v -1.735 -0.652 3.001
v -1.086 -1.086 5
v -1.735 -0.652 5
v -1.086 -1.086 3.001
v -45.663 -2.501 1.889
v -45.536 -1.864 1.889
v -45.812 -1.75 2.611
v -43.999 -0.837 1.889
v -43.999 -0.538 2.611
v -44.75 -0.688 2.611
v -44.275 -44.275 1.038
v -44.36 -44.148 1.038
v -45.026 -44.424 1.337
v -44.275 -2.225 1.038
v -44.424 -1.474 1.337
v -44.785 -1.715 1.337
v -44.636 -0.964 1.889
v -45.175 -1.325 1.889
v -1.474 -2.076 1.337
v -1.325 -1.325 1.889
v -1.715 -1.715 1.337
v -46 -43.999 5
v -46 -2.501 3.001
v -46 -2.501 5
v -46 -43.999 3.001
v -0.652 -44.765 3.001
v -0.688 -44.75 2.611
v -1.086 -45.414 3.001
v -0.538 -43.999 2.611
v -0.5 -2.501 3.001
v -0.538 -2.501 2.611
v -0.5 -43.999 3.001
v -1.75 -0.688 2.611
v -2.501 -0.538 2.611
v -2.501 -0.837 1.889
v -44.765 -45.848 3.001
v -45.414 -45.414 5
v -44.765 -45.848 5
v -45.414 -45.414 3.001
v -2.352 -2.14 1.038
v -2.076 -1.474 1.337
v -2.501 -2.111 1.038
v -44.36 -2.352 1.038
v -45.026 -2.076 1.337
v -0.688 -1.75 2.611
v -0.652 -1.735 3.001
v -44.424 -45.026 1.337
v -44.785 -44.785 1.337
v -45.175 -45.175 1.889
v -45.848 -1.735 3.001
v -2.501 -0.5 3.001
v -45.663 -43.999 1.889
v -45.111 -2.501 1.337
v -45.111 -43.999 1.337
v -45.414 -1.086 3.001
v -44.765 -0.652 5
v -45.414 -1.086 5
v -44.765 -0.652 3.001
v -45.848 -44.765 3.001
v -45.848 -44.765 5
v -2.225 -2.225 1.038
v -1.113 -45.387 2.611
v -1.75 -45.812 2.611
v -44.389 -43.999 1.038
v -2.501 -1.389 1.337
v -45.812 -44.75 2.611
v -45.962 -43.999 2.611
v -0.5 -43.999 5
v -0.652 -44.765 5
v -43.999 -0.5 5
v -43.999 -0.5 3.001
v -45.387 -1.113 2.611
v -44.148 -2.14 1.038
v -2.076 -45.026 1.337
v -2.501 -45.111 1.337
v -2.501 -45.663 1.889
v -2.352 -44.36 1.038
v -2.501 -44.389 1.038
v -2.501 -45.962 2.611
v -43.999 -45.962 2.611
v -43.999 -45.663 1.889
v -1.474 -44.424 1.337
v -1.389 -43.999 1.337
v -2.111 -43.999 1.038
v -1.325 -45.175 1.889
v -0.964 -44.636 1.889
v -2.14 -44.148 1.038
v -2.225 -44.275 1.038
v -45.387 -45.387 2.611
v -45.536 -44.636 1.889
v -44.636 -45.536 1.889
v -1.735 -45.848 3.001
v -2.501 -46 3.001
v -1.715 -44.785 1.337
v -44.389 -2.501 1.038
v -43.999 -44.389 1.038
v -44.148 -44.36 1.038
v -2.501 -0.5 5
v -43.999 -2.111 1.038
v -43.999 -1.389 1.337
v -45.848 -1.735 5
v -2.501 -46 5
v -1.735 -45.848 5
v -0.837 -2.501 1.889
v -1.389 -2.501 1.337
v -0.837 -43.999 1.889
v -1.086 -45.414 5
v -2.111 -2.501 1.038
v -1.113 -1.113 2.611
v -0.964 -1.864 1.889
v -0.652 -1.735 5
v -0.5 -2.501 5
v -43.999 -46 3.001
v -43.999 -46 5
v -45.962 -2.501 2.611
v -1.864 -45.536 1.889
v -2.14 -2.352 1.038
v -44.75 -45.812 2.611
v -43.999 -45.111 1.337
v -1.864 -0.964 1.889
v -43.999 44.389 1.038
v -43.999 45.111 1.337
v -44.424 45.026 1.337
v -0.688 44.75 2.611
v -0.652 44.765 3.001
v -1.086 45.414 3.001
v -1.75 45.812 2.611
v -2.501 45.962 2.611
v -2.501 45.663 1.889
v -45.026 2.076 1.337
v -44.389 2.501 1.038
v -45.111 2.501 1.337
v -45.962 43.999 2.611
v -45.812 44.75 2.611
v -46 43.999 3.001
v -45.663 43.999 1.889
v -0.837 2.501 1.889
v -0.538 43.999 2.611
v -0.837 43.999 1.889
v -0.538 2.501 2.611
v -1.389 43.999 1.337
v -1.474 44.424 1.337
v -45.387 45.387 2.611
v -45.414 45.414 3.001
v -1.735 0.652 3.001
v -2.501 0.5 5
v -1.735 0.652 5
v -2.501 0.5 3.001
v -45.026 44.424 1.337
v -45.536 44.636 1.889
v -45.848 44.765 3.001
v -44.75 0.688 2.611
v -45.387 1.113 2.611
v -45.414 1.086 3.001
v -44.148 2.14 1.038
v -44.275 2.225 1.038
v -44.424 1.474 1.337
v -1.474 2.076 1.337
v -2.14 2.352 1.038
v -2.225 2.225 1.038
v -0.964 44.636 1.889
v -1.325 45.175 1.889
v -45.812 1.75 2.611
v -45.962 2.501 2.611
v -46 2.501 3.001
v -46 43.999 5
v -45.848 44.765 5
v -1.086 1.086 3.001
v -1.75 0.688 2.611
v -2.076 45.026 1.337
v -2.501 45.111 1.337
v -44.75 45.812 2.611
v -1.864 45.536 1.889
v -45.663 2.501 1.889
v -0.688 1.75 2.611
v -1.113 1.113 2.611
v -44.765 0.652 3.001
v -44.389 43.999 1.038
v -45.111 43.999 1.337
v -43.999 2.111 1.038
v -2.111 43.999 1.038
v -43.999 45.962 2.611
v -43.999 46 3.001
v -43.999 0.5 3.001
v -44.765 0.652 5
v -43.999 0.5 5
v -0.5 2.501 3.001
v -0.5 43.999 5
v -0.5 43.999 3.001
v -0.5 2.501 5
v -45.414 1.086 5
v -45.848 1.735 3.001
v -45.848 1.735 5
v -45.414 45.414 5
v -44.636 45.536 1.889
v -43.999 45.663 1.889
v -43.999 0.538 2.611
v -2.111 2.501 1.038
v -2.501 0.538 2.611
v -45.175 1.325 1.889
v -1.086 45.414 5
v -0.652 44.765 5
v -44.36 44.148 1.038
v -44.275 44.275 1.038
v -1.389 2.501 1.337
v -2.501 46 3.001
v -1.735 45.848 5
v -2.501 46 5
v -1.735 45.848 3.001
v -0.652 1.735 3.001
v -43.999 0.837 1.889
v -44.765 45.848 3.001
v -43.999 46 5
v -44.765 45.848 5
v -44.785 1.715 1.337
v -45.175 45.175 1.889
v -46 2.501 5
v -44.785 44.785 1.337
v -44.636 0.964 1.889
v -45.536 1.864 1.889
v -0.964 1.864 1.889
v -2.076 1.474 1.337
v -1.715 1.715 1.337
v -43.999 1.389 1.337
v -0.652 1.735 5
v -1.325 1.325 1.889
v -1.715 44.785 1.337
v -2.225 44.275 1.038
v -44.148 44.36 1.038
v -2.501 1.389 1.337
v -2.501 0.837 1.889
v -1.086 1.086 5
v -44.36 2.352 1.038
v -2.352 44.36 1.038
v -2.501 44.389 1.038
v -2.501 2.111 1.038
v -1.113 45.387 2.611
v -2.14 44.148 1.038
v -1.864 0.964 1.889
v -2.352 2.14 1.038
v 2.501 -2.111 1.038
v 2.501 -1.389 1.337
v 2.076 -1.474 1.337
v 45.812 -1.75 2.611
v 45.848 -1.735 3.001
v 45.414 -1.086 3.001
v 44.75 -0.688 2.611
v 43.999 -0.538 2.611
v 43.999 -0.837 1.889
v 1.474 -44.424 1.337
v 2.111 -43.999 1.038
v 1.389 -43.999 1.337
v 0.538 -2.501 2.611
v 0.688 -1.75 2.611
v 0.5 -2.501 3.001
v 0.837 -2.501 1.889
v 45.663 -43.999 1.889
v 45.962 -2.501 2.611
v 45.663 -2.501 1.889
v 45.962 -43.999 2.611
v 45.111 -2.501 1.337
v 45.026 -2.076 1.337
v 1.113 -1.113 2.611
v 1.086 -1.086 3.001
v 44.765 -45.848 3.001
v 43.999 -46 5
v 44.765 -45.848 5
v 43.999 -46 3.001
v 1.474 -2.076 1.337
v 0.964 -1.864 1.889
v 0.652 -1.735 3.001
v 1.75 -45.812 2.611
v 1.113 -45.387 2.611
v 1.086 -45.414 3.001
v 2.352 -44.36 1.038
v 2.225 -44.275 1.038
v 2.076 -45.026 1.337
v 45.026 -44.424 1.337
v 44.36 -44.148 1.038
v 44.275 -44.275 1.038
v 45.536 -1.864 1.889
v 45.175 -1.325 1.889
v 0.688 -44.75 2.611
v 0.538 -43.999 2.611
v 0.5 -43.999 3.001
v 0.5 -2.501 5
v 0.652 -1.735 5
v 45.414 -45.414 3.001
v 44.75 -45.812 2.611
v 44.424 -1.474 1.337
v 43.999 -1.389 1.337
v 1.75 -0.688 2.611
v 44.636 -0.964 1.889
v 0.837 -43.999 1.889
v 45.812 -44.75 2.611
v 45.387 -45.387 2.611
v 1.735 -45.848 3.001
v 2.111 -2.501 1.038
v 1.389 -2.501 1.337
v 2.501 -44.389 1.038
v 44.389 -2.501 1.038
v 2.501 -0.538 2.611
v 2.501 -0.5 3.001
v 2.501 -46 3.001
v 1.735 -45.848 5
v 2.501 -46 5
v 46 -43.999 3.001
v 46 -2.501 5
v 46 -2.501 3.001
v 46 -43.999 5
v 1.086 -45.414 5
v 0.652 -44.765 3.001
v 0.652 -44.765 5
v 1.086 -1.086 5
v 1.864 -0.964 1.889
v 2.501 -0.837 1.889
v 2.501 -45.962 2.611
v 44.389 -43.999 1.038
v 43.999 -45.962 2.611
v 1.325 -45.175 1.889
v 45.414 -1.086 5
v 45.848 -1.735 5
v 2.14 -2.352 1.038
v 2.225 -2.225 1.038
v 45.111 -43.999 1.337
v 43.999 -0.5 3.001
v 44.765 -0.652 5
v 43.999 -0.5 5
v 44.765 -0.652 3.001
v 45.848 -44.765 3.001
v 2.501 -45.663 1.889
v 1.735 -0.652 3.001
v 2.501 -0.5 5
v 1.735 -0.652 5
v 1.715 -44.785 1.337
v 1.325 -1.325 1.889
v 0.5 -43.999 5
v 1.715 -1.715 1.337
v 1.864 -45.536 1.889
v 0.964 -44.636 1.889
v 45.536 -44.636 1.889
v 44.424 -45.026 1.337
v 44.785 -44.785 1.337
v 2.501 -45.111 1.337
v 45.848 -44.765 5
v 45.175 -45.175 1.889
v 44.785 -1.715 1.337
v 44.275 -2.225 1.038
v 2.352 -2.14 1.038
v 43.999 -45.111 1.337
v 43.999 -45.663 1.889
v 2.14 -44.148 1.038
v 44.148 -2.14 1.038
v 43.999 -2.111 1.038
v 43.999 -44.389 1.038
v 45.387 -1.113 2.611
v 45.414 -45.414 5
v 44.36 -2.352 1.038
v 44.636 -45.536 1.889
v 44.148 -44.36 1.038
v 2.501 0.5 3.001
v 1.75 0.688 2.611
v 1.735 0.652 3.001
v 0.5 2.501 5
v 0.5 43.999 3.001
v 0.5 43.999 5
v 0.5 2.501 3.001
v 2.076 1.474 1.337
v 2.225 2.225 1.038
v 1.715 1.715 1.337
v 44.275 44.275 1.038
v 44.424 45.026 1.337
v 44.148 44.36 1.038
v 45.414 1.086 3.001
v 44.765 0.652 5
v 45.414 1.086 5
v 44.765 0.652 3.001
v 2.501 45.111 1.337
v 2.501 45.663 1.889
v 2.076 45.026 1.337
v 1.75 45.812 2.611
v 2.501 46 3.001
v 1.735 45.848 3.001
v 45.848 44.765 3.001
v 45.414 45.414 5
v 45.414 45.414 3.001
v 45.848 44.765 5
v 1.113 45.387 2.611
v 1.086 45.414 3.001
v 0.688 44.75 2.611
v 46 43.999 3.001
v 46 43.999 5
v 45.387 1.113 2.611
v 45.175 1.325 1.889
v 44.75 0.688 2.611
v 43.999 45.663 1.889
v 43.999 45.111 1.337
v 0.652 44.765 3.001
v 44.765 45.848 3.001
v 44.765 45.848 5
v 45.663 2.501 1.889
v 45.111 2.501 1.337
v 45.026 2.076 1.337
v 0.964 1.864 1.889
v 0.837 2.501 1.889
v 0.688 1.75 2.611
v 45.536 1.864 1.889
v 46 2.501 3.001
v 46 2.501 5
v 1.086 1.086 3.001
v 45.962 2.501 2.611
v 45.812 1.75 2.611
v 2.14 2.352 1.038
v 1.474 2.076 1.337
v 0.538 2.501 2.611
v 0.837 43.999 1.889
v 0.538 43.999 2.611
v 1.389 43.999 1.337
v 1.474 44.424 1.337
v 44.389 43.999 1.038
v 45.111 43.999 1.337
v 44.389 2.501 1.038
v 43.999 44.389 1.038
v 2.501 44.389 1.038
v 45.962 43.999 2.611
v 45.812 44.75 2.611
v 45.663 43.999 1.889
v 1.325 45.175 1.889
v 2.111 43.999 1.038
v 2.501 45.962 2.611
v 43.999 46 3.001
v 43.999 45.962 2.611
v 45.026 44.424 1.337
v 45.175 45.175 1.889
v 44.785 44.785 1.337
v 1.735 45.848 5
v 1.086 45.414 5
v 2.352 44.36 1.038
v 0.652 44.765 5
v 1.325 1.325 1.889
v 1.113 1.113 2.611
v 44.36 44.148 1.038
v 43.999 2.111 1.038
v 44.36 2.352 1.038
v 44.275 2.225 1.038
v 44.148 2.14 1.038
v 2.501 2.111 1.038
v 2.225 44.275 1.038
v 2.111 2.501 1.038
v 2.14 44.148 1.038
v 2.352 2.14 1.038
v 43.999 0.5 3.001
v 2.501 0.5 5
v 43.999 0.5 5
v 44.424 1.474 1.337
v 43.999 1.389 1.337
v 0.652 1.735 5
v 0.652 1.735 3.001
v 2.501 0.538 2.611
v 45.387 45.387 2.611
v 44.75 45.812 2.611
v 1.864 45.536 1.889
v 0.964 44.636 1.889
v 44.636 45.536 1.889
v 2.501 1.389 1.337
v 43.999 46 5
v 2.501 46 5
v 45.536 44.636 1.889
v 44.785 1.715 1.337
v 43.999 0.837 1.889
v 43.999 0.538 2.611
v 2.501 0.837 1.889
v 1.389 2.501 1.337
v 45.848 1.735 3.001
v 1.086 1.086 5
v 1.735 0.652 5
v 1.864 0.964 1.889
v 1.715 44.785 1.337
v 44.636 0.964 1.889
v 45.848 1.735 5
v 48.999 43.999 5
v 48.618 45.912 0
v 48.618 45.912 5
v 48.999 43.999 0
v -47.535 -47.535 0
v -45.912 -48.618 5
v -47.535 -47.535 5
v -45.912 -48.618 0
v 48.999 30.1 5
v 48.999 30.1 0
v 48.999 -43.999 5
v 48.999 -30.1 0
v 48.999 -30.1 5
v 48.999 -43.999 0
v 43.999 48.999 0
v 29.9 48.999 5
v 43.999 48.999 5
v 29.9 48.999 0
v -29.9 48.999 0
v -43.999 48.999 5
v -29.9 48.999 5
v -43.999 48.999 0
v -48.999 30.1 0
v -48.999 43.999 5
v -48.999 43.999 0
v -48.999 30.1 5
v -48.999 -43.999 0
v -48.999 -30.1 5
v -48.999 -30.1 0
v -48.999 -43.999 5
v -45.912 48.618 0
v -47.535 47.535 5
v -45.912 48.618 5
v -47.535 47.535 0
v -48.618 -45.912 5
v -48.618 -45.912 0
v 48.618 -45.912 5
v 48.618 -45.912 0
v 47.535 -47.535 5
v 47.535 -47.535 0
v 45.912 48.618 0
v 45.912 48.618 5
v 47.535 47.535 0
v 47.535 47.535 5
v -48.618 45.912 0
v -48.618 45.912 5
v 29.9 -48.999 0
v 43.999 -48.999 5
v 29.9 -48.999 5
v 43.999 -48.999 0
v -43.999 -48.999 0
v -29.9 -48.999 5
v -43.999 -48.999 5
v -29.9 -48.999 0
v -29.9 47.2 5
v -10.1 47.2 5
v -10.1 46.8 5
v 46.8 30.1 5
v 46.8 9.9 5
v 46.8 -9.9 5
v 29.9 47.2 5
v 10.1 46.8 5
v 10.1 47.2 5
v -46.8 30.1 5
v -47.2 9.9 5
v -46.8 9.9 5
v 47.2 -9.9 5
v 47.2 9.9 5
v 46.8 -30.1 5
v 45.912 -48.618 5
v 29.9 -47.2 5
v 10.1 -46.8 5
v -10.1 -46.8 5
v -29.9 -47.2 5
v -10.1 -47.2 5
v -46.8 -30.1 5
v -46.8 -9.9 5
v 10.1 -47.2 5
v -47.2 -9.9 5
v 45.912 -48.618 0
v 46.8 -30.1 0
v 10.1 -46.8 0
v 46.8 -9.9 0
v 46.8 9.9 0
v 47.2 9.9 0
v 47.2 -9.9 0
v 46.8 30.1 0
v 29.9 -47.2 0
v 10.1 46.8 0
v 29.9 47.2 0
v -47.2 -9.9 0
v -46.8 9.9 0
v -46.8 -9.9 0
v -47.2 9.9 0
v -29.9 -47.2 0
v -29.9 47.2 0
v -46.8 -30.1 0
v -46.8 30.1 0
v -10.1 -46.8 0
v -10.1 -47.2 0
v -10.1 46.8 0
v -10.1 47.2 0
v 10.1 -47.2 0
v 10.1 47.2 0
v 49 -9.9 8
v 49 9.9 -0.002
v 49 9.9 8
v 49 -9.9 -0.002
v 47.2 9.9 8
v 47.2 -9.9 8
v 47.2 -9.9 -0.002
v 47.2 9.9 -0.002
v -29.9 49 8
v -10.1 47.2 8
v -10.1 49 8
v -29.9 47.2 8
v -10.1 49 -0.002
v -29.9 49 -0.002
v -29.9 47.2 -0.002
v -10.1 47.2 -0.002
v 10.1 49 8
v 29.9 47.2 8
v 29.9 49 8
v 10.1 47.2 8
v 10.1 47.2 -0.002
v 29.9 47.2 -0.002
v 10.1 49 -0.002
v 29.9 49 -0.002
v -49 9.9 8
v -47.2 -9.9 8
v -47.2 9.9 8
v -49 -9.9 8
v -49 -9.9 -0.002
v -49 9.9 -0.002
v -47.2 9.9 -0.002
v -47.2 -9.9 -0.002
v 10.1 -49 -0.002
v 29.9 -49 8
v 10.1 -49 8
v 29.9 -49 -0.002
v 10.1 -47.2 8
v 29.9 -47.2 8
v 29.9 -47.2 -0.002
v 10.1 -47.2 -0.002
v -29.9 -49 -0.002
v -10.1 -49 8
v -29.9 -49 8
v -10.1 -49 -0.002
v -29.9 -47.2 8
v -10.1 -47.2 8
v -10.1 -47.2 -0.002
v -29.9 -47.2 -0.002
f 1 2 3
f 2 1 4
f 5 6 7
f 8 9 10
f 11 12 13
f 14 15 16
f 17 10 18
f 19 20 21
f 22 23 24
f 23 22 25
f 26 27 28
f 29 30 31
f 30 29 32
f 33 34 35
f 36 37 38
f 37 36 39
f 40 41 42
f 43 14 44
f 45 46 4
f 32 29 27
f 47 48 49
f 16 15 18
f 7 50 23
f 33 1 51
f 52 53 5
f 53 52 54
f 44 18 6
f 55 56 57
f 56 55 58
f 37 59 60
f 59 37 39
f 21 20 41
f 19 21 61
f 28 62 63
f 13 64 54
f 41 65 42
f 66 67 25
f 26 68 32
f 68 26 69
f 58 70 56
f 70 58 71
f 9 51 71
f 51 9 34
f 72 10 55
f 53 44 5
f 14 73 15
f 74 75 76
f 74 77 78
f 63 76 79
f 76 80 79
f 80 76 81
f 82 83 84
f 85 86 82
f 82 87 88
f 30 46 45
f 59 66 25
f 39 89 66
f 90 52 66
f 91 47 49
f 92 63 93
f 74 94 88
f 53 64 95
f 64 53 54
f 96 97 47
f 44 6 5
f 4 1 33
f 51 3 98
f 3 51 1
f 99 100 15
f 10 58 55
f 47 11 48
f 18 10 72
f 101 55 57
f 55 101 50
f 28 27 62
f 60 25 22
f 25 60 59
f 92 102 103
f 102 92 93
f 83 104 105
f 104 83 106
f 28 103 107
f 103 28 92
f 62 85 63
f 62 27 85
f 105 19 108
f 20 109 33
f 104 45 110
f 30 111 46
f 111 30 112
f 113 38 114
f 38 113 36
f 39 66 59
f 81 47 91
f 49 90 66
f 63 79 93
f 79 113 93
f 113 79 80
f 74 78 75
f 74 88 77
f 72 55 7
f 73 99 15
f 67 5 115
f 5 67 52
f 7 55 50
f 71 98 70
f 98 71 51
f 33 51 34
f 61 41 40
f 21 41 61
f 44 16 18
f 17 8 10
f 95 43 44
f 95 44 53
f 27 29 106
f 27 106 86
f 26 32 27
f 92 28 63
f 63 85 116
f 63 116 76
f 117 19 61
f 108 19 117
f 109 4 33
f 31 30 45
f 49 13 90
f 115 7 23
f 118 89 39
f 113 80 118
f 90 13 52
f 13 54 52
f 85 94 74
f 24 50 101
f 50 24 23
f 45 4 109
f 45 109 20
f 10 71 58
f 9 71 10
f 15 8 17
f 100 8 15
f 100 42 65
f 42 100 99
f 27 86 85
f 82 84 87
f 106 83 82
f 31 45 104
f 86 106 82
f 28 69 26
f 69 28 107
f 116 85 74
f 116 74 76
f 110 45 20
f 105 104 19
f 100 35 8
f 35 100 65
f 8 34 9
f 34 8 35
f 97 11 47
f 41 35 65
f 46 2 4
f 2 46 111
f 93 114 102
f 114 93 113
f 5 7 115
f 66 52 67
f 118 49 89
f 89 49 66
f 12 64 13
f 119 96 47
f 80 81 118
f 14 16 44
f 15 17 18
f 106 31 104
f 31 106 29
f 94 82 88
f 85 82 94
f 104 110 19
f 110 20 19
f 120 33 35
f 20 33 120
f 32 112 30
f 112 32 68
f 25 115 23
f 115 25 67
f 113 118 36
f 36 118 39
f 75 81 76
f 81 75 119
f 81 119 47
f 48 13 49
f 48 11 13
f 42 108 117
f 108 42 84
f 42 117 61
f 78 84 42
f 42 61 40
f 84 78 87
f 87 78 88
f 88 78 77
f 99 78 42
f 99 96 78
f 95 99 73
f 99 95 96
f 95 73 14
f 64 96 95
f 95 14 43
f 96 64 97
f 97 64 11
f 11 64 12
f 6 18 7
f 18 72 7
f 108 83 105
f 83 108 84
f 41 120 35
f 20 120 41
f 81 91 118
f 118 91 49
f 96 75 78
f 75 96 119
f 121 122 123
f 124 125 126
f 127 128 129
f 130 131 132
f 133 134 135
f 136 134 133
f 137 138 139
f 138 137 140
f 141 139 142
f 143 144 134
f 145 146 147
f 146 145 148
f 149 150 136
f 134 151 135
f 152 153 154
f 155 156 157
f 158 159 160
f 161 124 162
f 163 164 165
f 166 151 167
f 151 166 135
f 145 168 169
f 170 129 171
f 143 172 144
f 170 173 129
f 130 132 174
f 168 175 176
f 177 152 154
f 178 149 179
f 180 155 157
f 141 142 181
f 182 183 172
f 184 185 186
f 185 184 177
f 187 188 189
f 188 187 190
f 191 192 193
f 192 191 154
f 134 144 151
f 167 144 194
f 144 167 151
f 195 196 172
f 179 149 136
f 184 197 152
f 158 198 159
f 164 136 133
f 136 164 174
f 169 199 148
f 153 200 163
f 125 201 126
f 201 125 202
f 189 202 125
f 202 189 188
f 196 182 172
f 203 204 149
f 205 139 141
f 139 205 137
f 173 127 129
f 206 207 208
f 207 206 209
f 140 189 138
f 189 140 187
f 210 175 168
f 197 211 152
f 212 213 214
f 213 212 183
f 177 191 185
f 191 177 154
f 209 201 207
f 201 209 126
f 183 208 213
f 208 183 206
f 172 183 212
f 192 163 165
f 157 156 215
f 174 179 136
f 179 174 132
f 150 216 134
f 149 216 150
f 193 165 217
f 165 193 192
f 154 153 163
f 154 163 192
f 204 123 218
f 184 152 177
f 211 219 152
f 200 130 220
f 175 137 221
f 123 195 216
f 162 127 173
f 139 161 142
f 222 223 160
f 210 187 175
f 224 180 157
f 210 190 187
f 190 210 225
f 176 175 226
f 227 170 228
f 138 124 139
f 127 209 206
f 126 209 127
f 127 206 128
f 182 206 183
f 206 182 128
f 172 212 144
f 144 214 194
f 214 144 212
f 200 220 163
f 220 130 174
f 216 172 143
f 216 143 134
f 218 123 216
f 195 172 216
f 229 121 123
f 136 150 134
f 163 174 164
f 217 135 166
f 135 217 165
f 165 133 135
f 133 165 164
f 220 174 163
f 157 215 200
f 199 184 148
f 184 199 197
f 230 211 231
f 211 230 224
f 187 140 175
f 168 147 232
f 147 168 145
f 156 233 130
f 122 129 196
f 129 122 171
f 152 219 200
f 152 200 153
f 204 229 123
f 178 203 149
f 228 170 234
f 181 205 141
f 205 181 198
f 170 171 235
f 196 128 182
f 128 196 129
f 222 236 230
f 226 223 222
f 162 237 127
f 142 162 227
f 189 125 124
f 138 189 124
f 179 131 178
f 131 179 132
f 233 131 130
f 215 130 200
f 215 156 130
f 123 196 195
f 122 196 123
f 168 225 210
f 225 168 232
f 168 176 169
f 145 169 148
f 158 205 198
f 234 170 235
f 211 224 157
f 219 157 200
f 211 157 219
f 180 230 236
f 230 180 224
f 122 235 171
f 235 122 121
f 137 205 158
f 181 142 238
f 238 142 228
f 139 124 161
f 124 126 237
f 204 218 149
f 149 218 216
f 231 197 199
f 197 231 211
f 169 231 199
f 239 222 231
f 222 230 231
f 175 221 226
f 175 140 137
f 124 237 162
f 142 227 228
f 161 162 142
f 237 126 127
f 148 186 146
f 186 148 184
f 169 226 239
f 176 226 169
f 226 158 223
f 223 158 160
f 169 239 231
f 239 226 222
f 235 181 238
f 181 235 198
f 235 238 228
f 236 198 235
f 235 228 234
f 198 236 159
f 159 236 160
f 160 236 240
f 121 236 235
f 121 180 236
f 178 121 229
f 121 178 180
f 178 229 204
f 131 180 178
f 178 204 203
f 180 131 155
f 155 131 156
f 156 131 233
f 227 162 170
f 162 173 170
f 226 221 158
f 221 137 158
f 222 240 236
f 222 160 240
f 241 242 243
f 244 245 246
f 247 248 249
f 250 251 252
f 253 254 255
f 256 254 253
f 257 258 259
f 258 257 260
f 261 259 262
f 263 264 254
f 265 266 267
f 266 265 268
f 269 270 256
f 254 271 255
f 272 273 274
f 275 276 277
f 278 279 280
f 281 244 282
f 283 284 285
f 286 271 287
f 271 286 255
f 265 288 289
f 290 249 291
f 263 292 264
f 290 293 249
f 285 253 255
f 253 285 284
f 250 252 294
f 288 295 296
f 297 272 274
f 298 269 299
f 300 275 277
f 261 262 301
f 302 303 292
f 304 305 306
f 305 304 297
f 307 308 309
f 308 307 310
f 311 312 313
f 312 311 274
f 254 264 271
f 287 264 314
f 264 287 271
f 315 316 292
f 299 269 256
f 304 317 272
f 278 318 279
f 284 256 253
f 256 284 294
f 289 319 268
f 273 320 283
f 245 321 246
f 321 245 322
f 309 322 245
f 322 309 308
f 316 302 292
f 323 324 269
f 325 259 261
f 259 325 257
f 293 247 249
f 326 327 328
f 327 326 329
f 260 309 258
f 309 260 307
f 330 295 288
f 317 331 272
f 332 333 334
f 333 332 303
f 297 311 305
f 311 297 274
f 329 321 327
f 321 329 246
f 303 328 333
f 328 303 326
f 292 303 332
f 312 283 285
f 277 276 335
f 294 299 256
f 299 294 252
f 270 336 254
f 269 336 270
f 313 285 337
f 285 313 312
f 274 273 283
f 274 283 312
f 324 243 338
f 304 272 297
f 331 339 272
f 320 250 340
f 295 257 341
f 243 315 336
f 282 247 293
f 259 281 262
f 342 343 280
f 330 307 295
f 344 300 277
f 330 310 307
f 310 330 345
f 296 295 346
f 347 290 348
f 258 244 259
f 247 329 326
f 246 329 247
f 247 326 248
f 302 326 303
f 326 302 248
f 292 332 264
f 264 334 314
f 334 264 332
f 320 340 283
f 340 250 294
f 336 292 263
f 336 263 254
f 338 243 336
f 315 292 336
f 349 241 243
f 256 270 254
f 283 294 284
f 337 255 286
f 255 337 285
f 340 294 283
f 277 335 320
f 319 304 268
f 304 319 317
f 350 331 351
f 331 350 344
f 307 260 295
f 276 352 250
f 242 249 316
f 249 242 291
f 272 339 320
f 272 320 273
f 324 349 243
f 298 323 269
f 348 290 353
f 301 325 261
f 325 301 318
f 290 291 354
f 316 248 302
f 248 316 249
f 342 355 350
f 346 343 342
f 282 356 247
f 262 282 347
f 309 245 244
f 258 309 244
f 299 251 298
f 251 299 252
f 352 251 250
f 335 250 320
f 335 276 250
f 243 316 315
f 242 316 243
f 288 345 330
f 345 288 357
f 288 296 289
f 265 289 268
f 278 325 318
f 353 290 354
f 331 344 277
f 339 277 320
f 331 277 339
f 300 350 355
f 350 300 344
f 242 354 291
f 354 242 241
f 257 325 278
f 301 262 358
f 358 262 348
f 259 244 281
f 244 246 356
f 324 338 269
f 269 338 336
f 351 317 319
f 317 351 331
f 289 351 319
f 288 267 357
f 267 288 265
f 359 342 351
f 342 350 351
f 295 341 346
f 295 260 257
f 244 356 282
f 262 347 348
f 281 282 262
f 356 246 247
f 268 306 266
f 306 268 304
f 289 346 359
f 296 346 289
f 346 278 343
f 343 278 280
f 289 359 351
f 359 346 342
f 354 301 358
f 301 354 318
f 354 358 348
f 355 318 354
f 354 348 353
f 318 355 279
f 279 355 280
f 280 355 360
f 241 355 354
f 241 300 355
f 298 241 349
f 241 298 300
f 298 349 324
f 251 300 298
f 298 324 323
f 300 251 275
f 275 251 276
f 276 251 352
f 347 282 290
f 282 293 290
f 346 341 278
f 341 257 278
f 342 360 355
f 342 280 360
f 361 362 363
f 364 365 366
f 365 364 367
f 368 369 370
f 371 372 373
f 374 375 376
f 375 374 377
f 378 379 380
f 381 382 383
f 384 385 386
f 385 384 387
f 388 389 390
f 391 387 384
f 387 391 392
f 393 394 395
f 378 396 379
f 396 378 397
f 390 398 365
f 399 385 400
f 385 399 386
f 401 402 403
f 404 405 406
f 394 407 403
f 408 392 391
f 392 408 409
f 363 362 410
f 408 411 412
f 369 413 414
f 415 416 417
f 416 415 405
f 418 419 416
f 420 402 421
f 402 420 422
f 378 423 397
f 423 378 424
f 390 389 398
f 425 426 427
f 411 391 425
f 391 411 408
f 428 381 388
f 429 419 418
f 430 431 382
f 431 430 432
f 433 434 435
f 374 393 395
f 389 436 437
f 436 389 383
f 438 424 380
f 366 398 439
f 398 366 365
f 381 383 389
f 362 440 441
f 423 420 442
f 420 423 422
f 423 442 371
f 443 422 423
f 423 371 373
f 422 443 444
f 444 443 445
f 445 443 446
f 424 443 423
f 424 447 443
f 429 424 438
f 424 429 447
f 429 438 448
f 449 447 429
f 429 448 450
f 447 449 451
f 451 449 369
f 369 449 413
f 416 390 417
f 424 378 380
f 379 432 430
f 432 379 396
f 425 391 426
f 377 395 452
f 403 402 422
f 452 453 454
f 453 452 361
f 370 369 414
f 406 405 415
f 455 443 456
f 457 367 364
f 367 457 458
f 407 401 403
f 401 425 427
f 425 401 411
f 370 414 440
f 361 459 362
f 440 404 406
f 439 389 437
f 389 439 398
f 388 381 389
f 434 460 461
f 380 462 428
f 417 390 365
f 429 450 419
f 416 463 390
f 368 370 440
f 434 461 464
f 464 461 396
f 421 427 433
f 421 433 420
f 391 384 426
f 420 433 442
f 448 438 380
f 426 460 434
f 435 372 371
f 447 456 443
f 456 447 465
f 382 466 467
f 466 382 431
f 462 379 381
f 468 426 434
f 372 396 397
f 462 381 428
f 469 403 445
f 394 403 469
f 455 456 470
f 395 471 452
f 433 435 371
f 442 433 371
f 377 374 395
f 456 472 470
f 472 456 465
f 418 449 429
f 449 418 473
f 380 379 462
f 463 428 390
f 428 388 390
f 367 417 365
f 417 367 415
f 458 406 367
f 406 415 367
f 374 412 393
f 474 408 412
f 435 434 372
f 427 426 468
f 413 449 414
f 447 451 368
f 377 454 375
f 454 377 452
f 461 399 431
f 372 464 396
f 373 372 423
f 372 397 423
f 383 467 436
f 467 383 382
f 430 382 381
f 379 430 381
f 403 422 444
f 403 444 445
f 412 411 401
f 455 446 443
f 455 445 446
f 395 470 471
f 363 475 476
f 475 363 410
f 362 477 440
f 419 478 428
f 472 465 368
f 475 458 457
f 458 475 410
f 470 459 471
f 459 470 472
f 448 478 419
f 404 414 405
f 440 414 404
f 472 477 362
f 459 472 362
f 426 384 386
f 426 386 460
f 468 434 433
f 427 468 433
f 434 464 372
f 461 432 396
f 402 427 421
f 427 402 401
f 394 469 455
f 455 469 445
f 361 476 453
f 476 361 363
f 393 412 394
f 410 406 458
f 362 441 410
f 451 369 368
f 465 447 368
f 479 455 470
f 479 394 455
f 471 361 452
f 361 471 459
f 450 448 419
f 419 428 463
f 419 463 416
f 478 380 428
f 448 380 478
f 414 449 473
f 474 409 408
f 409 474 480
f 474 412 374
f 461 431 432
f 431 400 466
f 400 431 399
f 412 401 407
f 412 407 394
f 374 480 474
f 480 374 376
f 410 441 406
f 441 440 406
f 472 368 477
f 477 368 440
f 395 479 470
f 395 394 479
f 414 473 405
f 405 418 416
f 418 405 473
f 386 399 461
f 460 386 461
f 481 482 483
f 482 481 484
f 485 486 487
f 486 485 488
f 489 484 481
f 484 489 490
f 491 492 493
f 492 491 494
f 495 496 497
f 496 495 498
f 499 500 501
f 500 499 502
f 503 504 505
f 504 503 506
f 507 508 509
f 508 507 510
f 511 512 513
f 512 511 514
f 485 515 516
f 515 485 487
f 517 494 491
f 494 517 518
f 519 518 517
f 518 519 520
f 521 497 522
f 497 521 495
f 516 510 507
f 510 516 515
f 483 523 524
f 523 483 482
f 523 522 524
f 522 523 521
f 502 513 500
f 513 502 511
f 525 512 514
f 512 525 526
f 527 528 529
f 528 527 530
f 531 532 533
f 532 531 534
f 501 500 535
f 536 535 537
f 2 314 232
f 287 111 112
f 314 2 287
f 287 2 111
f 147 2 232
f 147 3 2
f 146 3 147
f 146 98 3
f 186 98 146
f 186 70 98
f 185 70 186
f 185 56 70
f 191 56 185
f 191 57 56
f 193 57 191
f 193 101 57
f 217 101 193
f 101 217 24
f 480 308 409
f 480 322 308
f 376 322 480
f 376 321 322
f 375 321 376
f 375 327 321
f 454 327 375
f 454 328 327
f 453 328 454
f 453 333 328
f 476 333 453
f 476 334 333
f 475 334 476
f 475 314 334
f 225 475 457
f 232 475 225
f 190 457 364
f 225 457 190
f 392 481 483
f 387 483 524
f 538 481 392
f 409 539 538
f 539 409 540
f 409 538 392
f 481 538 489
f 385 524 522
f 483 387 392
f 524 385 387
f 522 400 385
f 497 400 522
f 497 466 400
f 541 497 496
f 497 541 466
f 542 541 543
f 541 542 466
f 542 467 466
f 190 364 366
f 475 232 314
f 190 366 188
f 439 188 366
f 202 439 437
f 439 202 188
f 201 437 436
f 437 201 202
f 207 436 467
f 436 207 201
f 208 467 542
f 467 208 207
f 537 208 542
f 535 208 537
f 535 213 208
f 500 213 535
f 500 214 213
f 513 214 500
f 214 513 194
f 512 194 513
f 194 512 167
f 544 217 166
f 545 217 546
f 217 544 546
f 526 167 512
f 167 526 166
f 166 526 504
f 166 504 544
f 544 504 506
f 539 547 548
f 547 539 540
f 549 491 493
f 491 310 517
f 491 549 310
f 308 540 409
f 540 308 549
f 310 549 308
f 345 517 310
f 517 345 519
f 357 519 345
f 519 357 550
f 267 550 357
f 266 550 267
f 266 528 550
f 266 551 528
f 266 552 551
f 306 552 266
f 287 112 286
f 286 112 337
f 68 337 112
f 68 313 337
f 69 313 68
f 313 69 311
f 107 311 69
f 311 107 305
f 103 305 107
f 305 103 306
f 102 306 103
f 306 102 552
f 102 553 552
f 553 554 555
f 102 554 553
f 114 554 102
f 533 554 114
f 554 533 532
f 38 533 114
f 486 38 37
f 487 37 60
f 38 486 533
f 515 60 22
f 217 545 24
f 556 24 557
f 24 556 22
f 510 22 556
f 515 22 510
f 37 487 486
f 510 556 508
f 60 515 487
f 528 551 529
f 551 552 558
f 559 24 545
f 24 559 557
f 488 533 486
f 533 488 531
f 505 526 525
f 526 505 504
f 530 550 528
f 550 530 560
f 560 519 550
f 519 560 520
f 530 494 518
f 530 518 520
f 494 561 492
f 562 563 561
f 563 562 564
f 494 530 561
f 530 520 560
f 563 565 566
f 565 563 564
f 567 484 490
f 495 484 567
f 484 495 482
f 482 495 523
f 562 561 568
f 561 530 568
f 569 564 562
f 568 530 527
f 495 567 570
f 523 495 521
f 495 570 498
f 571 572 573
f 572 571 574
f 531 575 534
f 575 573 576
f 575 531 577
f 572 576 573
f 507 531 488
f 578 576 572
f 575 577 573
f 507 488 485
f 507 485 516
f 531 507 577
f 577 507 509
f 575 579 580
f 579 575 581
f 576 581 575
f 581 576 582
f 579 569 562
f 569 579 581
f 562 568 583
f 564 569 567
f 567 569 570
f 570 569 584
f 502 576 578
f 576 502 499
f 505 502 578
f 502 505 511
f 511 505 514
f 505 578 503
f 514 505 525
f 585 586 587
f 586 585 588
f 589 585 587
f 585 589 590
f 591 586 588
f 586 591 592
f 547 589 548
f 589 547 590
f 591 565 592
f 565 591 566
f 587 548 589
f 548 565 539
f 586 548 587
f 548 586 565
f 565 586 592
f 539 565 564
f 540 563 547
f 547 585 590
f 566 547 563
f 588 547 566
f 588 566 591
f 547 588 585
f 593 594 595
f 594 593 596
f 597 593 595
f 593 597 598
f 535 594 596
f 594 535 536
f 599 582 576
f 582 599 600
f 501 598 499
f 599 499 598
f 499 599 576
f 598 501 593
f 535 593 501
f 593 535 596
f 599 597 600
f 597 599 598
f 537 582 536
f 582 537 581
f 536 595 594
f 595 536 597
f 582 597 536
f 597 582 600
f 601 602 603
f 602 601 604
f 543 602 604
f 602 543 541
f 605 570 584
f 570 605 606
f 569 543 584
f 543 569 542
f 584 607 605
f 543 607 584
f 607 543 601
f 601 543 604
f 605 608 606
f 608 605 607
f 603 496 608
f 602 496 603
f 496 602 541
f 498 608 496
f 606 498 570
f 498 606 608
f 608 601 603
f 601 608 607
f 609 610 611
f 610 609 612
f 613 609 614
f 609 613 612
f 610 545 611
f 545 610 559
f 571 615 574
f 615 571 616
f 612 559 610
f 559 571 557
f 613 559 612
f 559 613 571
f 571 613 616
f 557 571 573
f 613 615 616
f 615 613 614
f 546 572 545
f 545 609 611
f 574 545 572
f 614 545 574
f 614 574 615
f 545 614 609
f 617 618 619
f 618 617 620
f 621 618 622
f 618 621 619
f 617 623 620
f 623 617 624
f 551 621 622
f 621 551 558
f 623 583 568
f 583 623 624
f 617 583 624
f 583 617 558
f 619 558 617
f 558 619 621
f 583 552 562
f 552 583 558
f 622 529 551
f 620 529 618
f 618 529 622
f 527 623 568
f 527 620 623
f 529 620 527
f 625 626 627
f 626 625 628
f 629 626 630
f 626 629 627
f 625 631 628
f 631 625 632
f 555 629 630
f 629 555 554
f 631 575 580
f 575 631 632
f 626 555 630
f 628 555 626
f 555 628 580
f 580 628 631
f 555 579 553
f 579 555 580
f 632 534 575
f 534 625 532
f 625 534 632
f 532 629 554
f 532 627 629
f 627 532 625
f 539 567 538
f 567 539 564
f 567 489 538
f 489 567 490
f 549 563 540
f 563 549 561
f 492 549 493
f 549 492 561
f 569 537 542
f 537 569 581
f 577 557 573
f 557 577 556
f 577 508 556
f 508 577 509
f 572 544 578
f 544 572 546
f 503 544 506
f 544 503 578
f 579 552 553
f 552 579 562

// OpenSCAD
// preview[view:south west, tilt:top diagonal]

/* [Main Settings] */
// The Inner Height of the Cells
height=4;  // [2,3,4,6,8,12,16,24,32,48,64,96,128]

// Number of Rows
rows=2;   // [1:8]

// Number of Columns
columns=2;   // [1:8]

// Radius Used to Round Off Inner Edges
radius=2;  // [0:8]

/* [Enable Features] */
// Add Joints to the Next Tray 
addJoint=1; // [0:No, 1:Yes]

// Round the Floor of the Cells
roundFloor=1; // [0:No, 1:Yes]

// Add Corners to Keep Square Notes
addEdges=0; // [0:No, 1:Yes]

/* [Hidden] */
fl=92; // floor length
wt=1;  // wall thickness
jt=2;  // joint thickness
jw=20; // joint width
jh=3;  // joint height
tl=0.1; // toleranz
el=8;  // edge length

ih=height;
n=rows;
m=columns;
rr=radius+0.001;
ro=fl/2-rr;
ri=fl/2+wt/2;
$fn=16;

module joint(y, a, t) {
    rotate(a)
        translate([fl/2+wt+jt/2+t,y,(jh+wt+ih)/2-0.001])
            cube([jt-2*t,jw-2*t,jh+wt+ih+0.002],center=true);
}

module rounding_inner()
    if (roundFloor) translate([0,0,rr+wt]) {
        sphere(r=rr);
        cylinder(r=rr, h=ih-rr+0.001);
    } else translate([0,0,wt])
        cylinder(r=rr, h=ih+0.001);

module rounding_outer() {
    cylinder(r=rr+wt+jt-0.001, h=ih+wt);
}

difference() {
    union() {
        difference() {
            hull() for (x=[-1:2:1]) for (y=[-1:2:1])
                translate([x*ro,y*ro,0]) rounding_outer();
            for (x=[0:n-1]) for (y=[0:m-1])
                hull() for (i=[0:1]) for (j=[0:1])
                    translate([-ri+2*ri*(x+i)/n + (1-2*i)*(wt/2+rr), -ri+2*ri*(y+j)/m + (1-2*j)*(wt/2+rr),0])
                        rounding_inner();
        }
        if (addJoint) {
            joint(0, 0, tl);
            joint(jw, 90, tl);
            joint(-jw, 90, tl);
            joint(0, 180, tl);
            joint(jw, 270, tl);
            joint(-jw, 270, tl);
        }
        if (addEdges) translate([0,0,ih]) linear_extrude(height=wt)
            for (x=[-1:2:1]) for (y=[-1:2:1])
                polygon([[x*fl/2,y*fl/2],[x*fl/2,y*(fl/2-el)],[x*(fl/2-el),y*fl/2]]);
    }
    joint(jw, 0, -tl);
    joint(-jw, 0, -tl);
    joint(0, 90, -tl);
    joint(jw, 180, -tl);
    joint(-jw, 180, -tl);
    joint(0, 270, -tl);
}


    
